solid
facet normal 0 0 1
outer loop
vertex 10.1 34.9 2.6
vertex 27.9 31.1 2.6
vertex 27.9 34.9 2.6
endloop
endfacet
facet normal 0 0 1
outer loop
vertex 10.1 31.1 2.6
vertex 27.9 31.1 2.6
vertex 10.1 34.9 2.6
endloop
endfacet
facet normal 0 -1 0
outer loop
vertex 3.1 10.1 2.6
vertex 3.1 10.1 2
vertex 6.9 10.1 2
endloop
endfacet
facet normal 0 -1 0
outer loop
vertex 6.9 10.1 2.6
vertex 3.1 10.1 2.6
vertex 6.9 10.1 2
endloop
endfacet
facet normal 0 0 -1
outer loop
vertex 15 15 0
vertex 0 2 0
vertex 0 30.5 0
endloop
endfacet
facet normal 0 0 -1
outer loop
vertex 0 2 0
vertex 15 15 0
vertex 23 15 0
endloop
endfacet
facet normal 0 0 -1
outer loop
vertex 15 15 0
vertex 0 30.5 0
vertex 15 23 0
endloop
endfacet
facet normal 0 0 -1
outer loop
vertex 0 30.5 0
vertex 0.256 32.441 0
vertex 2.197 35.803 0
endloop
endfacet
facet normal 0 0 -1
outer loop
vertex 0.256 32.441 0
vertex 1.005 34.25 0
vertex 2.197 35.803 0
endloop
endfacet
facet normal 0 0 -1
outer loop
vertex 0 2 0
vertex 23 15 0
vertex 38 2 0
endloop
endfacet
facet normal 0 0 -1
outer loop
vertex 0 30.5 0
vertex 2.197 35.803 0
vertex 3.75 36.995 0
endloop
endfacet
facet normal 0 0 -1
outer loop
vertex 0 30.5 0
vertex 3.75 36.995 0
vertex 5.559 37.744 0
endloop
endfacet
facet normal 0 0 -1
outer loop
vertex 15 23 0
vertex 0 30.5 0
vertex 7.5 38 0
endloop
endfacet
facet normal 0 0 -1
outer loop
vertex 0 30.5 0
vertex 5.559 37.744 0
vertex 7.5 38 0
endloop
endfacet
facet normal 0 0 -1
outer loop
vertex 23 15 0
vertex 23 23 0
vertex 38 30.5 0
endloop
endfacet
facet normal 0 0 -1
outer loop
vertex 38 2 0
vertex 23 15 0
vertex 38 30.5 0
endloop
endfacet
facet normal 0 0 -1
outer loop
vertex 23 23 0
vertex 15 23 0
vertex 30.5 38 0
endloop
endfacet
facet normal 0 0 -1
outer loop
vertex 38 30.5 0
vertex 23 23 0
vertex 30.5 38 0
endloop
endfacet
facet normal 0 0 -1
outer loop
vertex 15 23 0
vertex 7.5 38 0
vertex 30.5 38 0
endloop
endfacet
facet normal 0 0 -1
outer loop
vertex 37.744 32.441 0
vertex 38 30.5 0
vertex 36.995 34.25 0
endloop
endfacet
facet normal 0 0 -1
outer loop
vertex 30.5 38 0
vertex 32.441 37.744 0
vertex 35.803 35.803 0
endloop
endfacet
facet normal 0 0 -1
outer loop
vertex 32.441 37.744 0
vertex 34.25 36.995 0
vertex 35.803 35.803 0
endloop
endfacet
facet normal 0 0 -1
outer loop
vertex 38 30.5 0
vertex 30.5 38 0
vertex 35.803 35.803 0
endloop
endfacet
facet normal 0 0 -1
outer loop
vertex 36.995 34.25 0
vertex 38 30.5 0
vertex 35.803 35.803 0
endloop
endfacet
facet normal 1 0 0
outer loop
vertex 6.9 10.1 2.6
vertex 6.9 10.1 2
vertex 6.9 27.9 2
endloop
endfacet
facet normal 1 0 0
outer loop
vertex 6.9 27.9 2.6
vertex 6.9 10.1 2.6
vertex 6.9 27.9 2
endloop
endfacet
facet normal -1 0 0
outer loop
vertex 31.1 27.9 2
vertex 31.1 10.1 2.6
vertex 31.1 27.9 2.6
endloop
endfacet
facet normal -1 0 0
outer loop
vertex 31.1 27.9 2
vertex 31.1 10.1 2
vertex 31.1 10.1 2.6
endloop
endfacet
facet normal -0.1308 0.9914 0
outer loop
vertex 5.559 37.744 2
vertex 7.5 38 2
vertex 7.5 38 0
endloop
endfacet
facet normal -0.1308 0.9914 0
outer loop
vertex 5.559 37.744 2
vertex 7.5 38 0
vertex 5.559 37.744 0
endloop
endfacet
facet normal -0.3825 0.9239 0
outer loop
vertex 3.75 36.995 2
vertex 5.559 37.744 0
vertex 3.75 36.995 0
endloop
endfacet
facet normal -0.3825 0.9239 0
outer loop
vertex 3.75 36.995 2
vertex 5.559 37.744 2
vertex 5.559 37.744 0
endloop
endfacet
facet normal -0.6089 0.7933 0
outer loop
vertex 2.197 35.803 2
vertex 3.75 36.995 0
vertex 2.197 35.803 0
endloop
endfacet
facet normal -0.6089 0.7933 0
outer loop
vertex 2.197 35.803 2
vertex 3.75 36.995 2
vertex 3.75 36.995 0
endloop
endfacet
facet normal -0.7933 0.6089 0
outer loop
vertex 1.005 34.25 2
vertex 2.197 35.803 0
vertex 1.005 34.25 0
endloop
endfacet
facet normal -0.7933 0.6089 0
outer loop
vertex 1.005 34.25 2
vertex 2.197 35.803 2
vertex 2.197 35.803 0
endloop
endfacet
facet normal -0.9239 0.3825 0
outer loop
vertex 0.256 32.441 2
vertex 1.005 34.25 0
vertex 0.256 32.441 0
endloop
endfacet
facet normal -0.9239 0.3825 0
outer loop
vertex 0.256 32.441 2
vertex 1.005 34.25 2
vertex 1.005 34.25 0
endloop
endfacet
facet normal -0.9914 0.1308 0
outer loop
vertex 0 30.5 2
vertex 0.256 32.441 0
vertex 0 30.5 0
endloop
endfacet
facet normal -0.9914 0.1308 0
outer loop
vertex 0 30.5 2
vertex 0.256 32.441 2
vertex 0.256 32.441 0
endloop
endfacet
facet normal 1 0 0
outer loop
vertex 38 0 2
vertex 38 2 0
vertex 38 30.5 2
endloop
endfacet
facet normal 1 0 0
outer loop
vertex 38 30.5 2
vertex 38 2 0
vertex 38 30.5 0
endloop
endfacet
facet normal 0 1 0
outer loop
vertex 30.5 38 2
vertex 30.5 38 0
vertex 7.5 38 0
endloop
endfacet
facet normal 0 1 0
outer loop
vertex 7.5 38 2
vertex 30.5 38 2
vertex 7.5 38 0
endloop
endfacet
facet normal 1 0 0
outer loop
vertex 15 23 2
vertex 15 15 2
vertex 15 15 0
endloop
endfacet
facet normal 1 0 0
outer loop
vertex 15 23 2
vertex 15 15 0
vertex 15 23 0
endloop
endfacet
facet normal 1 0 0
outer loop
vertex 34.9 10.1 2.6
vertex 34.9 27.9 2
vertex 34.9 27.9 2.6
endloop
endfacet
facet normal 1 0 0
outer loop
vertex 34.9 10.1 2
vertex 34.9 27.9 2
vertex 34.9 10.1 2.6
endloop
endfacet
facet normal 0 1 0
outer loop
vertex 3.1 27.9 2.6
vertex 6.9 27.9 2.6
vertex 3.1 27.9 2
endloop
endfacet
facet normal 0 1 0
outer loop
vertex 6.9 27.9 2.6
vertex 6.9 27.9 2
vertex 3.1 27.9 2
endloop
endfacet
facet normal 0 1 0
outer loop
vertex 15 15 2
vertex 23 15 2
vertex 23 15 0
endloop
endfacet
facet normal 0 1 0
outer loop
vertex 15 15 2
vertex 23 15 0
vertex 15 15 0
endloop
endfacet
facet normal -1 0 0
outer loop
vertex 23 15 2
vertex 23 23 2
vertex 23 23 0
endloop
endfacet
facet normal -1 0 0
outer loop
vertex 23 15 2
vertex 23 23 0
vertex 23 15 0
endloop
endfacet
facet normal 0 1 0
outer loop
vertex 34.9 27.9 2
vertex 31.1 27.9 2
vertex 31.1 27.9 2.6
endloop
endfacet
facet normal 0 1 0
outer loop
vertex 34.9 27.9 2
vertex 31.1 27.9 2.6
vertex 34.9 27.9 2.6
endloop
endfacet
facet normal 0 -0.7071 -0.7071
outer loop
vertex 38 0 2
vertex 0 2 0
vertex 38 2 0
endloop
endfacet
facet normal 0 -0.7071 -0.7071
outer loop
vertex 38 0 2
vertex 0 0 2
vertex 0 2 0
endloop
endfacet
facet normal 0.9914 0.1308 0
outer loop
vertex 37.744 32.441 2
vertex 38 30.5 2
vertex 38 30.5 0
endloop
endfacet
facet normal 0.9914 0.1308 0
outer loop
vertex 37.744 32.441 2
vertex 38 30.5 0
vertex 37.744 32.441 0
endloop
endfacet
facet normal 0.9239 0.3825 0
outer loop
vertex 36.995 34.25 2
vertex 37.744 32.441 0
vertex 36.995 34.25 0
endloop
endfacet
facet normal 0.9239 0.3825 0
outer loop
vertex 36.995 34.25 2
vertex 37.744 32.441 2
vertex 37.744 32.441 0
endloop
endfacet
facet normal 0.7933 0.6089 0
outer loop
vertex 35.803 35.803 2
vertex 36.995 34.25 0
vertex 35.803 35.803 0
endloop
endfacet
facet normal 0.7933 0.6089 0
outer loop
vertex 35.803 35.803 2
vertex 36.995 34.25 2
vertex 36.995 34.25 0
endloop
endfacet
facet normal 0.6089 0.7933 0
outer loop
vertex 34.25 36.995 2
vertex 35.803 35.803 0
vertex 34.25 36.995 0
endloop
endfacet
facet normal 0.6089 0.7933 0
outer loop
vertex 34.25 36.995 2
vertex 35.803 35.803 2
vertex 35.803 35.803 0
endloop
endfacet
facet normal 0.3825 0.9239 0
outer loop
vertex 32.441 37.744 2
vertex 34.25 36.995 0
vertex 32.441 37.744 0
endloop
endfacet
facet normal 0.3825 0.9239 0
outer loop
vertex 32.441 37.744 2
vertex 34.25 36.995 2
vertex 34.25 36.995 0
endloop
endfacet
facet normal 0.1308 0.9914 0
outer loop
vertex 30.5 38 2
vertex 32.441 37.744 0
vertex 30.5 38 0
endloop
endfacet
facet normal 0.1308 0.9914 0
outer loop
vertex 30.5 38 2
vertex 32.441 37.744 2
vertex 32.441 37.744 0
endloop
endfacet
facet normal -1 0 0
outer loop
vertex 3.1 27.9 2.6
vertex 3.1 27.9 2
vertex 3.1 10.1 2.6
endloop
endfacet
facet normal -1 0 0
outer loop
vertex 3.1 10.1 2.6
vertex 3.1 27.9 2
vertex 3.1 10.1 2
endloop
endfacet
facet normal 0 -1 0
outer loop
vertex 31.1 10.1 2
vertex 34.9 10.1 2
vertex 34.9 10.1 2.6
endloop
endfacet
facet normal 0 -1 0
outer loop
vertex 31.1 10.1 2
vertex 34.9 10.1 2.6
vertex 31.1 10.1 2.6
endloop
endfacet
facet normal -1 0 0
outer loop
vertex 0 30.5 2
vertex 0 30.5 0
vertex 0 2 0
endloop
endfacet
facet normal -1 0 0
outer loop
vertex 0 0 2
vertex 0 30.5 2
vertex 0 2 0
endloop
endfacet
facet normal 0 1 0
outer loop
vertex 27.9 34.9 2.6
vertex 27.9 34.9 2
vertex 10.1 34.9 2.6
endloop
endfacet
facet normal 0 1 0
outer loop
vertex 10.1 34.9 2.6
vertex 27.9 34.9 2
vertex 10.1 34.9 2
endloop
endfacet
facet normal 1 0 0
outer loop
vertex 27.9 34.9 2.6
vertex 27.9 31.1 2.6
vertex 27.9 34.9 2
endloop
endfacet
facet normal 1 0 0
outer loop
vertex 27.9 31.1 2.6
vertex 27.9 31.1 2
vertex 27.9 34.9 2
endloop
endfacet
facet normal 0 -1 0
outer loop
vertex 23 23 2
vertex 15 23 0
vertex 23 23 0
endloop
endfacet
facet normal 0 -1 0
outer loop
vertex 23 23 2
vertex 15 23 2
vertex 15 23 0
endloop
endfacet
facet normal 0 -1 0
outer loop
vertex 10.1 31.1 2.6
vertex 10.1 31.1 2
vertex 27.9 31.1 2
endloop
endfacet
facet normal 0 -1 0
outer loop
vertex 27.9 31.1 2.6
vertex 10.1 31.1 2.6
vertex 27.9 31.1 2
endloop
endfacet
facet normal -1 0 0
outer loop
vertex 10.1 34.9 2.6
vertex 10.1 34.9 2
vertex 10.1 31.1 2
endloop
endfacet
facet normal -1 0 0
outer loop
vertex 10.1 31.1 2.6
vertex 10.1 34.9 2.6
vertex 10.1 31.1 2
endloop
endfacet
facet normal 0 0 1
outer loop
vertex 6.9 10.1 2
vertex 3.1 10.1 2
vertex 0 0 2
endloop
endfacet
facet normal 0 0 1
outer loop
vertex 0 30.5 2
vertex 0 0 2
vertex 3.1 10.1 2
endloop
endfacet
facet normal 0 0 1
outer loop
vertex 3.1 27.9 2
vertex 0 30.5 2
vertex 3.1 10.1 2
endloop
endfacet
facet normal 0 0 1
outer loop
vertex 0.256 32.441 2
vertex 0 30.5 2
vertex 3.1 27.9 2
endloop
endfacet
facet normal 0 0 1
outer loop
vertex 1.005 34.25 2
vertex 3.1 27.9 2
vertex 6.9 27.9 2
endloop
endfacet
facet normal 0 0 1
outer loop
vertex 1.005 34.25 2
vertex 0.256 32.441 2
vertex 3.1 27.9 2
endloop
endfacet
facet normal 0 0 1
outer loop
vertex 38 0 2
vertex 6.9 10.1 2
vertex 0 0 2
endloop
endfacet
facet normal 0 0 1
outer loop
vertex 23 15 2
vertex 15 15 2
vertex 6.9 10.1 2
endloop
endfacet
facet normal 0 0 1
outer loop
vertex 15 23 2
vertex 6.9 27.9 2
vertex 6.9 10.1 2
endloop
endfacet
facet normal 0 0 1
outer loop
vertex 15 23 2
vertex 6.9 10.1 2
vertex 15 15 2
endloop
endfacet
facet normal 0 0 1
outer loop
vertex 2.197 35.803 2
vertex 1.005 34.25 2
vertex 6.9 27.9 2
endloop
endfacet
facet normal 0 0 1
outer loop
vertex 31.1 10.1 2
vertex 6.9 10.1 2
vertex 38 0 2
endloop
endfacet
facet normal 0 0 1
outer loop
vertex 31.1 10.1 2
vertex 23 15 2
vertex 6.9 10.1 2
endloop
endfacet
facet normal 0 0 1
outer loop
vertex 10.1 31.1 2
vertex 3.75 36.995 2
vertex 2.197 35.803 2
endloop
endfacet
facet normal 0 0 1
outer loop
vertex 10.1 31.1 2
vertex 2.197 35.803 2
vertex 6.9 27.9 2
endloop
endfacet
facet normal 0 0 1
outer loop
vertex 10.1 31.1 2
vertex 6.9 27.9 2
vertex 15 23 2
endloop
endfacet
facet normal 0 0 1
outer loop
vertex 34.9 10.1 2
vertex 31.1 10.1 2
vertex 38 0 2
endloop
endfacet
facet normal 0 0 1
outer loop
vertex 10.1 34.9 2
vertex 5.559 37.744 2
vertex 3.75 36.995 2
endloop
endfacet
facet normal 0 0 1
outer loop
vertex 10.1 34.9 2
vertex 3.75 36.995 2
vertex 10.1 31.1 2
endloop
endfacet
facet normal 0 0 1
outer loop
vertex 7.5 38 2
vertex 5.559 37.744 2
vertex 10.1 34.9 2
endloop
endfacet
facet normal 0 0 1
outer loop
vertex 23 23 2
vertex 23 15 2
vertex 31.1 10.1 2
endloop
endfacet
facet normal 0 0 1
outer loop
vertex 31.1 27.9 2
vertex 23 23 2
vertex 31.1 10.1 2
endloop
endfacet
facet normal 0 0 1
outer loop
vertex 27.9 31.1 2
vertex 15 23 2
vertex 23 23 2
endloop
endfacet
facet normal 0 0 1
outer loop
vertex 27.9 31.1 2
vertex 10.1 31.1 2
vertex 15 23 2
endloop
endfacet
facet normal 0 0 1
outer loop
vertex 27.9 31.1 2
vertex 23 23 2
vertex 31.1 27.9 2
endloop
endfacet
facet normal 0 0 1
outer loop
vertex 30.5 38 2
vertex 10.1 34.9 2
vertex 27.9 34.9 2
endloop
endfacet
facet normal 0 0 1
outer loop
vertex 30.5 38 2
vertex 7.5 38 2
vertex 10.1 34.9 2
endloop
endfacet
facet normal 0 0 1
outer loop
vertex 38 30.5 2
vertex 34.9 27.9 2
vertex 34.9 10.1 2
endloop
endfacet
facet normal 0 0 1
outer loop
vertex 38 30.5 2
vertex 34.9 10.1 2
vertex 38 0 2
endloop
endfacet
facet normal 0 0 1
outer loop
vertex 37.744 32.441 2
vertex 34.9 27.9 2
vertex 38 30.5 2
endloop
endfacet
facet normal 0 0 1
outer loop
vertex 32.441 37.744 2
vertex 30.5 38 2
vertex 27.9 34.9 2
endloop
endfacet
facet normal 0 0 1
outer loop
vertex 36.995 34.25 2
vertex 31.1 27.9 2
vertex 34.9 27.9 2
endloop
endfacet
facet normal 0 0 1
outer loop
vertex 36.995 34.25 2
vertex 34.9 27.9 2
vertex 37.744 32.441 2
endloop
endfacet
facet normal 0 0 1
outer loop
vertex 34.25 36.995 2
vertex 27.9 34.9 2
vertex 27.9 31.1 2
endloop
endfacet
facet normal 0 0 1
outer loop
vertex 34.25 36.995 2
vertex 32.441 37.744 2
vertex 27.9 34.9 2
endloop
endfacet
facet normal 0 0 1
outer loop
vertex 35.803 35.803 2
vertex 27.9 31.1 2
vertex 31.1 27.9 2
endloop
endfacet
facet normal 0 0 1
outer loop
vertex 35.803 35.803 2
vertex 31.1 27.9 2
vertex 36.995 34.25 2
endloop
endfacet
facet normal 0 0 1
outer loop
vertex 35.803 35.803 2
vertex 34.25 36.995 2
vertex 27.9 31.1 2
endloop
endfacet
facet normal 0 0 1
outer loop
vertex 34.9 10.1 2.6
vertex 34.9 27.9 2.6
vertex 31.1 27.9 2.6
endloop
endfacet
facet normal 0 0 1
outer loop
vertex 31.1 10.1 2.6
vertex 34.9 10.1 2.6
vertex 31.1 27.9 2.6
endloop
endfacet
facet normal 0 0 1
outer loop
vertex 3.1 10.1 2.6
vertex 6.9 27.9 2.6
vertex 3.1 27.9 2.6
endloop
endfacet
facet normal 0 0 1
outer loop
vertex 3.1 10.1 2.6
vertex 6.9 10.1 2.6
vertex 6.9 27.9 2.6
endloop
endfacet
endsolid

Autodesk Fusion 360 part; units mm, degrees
sketch "Sketch1" plane through (0, 0, 0) normal (0, 0, 1) x (1, 0, 0)
  line L0 (0, 0) -> (38, 0)
  line L1 (38, 0) -> (38, 38)
  line L2 (38, 38) -> (0, 38)
  line L3 (0, 38) -> (0, 0)
  dimension "d1" = 38
  dimension "d2" = 38
extrude "Extrude1" add sketch "Sketch1" along normal blind 2
sketch "Sketch2" plane through (0, 0, 2) normal (0, 0, 1) x (-1, 0, 0)
  line L0 (0, -38) -> (0, 0)
  line L1 (0, 0) -> (-38, 0)
  line L2 (-38, 0) -> (-38, -38)
  line L3 (-38, -38) -> (0, -38)
  line L4 (-23, -23) -> (-23, -15)
  line L5 (-23, -15) -> (-15, -15)
  line L6 (-15, -15) -> (-15, -23)
  line L7 (-15, -23) -> (-23, -23)
  dimension "d6" = 8
  dimension "d7" = 8
  dimension "d8" = 8
  dimension "d9" = 15
  dimension "d10" = 15
extrude "Extrude2" cut sketch "Sketch2" against normal blind 7 contours L4 L5 L6 L7
sketch "Sketch3" plane through (0, 0, 2) normal (0, 0, 1) x (-1, 0, 0)
  line L0 (-23, -15) -> (-15, -15)
  line L1 (-15, -15) -> (-15, -23)
  line L2 (-15, -23) -> (-23, -23)
  line L3 (-23, -23) -> (-23, -15)
  line L4 (0, -38) -> (0, 0)
  line L5 (0, 0) -> (-38, 0)
  line L6 (-38, 0) -> (-38, -38)
  line L7 (-38, -38) -> (0, -38)
  line L8 (-15, -23) -> (-15, -28)
  line L9 (-15, -28) -> (-10, -28)
  line L10 (-10, -28) -> (-28, -28)
  line L11 (-28, -28) -> (-28, -10)
  line L12 (-28, -10) -> (-10, -10)
  line L13 (-10, -10) -> (-10, -28)
  line L14 (-31, -28) -> (-35, -28)
  line L15 (-35, -28) -> (-35, -10)
  line L16 (-35, -10) -> (-31, -10)
  line L17 (-31, -10) -> (-31, -28)
  line L18 (-19, -28) -> (-19, -10)
  line L19 (-28, -28) -> (-10, -10)
  line L20 (-28, -31) -> (-28, -35)
  line L21 (-10, -31) -> (-28, -31)
  line L22 (-28, -35) -> (-10, -35)
  line L23 (-10, -35) -> (-10, -31)
  line L24 (-7, -10) -> (-7, -28)
  line L25 (-7, -28) -> (-3, -28)
  line L26 (-3, -28) -> (-3, -10)
  line L27 (-3, -10) -> (-7, -10)
  line L28 (-31.1, -27.9) -> (-34.9, -27.9)
  line L29 (-34.9, -27.9) -> (-34.9, -10.1)
  line L30 (-34.9, -10.1) -> (-31.1, -10.1)
  line L31 (-31.1, -10.1) -> (-31.1, -27.9)
  line L32 (-27.9, -31.1) -> (-27.9, -34.9)
  line L33 (-10.1, -31.1) -> (-27.9, -31.1)
  line L34 (-27.9, -34.9) -> (-10.1, -34.9)
  line L35 (-10.1, -34.9) -> (-10.1, -31.1)
  line L36 (-6.9, -27.9) -> (-3.1, -27.9)
  line L37 (-6.9, -10.1) -> (-6.9, -27.9)
  line L38 (-3.1, -27.9) -> (-3.1, -10.1)
  line L39 (-3.1, -10.1) -> (-6.9, -10.1)
  dimension "d13" = 5
  dimension "d14" = 5
  dimension "d15" = 18
  dimension "d16" = 18
  dimension "d17" = 4
  dimension "d18" = 3
  dimension "d19" = 0.1
  dimension "d20" = 0.1
  dimension "d21" = 0.1
  dimension "d22" = 0.1
extrude "Extrude3" add sketch "Sketch3" along normal blind 0.6 contours L28 L29 L30 L31 | L32 L33 L34 L35 | L36 L37 L38 L39
fillet "Fillet1" radius 7.5 2 edges at (0, 38, 1) (38, 38, 1)
chamfer "Chamfer2" distance 2 angle 45 1 edges at (19, 0, 0)
